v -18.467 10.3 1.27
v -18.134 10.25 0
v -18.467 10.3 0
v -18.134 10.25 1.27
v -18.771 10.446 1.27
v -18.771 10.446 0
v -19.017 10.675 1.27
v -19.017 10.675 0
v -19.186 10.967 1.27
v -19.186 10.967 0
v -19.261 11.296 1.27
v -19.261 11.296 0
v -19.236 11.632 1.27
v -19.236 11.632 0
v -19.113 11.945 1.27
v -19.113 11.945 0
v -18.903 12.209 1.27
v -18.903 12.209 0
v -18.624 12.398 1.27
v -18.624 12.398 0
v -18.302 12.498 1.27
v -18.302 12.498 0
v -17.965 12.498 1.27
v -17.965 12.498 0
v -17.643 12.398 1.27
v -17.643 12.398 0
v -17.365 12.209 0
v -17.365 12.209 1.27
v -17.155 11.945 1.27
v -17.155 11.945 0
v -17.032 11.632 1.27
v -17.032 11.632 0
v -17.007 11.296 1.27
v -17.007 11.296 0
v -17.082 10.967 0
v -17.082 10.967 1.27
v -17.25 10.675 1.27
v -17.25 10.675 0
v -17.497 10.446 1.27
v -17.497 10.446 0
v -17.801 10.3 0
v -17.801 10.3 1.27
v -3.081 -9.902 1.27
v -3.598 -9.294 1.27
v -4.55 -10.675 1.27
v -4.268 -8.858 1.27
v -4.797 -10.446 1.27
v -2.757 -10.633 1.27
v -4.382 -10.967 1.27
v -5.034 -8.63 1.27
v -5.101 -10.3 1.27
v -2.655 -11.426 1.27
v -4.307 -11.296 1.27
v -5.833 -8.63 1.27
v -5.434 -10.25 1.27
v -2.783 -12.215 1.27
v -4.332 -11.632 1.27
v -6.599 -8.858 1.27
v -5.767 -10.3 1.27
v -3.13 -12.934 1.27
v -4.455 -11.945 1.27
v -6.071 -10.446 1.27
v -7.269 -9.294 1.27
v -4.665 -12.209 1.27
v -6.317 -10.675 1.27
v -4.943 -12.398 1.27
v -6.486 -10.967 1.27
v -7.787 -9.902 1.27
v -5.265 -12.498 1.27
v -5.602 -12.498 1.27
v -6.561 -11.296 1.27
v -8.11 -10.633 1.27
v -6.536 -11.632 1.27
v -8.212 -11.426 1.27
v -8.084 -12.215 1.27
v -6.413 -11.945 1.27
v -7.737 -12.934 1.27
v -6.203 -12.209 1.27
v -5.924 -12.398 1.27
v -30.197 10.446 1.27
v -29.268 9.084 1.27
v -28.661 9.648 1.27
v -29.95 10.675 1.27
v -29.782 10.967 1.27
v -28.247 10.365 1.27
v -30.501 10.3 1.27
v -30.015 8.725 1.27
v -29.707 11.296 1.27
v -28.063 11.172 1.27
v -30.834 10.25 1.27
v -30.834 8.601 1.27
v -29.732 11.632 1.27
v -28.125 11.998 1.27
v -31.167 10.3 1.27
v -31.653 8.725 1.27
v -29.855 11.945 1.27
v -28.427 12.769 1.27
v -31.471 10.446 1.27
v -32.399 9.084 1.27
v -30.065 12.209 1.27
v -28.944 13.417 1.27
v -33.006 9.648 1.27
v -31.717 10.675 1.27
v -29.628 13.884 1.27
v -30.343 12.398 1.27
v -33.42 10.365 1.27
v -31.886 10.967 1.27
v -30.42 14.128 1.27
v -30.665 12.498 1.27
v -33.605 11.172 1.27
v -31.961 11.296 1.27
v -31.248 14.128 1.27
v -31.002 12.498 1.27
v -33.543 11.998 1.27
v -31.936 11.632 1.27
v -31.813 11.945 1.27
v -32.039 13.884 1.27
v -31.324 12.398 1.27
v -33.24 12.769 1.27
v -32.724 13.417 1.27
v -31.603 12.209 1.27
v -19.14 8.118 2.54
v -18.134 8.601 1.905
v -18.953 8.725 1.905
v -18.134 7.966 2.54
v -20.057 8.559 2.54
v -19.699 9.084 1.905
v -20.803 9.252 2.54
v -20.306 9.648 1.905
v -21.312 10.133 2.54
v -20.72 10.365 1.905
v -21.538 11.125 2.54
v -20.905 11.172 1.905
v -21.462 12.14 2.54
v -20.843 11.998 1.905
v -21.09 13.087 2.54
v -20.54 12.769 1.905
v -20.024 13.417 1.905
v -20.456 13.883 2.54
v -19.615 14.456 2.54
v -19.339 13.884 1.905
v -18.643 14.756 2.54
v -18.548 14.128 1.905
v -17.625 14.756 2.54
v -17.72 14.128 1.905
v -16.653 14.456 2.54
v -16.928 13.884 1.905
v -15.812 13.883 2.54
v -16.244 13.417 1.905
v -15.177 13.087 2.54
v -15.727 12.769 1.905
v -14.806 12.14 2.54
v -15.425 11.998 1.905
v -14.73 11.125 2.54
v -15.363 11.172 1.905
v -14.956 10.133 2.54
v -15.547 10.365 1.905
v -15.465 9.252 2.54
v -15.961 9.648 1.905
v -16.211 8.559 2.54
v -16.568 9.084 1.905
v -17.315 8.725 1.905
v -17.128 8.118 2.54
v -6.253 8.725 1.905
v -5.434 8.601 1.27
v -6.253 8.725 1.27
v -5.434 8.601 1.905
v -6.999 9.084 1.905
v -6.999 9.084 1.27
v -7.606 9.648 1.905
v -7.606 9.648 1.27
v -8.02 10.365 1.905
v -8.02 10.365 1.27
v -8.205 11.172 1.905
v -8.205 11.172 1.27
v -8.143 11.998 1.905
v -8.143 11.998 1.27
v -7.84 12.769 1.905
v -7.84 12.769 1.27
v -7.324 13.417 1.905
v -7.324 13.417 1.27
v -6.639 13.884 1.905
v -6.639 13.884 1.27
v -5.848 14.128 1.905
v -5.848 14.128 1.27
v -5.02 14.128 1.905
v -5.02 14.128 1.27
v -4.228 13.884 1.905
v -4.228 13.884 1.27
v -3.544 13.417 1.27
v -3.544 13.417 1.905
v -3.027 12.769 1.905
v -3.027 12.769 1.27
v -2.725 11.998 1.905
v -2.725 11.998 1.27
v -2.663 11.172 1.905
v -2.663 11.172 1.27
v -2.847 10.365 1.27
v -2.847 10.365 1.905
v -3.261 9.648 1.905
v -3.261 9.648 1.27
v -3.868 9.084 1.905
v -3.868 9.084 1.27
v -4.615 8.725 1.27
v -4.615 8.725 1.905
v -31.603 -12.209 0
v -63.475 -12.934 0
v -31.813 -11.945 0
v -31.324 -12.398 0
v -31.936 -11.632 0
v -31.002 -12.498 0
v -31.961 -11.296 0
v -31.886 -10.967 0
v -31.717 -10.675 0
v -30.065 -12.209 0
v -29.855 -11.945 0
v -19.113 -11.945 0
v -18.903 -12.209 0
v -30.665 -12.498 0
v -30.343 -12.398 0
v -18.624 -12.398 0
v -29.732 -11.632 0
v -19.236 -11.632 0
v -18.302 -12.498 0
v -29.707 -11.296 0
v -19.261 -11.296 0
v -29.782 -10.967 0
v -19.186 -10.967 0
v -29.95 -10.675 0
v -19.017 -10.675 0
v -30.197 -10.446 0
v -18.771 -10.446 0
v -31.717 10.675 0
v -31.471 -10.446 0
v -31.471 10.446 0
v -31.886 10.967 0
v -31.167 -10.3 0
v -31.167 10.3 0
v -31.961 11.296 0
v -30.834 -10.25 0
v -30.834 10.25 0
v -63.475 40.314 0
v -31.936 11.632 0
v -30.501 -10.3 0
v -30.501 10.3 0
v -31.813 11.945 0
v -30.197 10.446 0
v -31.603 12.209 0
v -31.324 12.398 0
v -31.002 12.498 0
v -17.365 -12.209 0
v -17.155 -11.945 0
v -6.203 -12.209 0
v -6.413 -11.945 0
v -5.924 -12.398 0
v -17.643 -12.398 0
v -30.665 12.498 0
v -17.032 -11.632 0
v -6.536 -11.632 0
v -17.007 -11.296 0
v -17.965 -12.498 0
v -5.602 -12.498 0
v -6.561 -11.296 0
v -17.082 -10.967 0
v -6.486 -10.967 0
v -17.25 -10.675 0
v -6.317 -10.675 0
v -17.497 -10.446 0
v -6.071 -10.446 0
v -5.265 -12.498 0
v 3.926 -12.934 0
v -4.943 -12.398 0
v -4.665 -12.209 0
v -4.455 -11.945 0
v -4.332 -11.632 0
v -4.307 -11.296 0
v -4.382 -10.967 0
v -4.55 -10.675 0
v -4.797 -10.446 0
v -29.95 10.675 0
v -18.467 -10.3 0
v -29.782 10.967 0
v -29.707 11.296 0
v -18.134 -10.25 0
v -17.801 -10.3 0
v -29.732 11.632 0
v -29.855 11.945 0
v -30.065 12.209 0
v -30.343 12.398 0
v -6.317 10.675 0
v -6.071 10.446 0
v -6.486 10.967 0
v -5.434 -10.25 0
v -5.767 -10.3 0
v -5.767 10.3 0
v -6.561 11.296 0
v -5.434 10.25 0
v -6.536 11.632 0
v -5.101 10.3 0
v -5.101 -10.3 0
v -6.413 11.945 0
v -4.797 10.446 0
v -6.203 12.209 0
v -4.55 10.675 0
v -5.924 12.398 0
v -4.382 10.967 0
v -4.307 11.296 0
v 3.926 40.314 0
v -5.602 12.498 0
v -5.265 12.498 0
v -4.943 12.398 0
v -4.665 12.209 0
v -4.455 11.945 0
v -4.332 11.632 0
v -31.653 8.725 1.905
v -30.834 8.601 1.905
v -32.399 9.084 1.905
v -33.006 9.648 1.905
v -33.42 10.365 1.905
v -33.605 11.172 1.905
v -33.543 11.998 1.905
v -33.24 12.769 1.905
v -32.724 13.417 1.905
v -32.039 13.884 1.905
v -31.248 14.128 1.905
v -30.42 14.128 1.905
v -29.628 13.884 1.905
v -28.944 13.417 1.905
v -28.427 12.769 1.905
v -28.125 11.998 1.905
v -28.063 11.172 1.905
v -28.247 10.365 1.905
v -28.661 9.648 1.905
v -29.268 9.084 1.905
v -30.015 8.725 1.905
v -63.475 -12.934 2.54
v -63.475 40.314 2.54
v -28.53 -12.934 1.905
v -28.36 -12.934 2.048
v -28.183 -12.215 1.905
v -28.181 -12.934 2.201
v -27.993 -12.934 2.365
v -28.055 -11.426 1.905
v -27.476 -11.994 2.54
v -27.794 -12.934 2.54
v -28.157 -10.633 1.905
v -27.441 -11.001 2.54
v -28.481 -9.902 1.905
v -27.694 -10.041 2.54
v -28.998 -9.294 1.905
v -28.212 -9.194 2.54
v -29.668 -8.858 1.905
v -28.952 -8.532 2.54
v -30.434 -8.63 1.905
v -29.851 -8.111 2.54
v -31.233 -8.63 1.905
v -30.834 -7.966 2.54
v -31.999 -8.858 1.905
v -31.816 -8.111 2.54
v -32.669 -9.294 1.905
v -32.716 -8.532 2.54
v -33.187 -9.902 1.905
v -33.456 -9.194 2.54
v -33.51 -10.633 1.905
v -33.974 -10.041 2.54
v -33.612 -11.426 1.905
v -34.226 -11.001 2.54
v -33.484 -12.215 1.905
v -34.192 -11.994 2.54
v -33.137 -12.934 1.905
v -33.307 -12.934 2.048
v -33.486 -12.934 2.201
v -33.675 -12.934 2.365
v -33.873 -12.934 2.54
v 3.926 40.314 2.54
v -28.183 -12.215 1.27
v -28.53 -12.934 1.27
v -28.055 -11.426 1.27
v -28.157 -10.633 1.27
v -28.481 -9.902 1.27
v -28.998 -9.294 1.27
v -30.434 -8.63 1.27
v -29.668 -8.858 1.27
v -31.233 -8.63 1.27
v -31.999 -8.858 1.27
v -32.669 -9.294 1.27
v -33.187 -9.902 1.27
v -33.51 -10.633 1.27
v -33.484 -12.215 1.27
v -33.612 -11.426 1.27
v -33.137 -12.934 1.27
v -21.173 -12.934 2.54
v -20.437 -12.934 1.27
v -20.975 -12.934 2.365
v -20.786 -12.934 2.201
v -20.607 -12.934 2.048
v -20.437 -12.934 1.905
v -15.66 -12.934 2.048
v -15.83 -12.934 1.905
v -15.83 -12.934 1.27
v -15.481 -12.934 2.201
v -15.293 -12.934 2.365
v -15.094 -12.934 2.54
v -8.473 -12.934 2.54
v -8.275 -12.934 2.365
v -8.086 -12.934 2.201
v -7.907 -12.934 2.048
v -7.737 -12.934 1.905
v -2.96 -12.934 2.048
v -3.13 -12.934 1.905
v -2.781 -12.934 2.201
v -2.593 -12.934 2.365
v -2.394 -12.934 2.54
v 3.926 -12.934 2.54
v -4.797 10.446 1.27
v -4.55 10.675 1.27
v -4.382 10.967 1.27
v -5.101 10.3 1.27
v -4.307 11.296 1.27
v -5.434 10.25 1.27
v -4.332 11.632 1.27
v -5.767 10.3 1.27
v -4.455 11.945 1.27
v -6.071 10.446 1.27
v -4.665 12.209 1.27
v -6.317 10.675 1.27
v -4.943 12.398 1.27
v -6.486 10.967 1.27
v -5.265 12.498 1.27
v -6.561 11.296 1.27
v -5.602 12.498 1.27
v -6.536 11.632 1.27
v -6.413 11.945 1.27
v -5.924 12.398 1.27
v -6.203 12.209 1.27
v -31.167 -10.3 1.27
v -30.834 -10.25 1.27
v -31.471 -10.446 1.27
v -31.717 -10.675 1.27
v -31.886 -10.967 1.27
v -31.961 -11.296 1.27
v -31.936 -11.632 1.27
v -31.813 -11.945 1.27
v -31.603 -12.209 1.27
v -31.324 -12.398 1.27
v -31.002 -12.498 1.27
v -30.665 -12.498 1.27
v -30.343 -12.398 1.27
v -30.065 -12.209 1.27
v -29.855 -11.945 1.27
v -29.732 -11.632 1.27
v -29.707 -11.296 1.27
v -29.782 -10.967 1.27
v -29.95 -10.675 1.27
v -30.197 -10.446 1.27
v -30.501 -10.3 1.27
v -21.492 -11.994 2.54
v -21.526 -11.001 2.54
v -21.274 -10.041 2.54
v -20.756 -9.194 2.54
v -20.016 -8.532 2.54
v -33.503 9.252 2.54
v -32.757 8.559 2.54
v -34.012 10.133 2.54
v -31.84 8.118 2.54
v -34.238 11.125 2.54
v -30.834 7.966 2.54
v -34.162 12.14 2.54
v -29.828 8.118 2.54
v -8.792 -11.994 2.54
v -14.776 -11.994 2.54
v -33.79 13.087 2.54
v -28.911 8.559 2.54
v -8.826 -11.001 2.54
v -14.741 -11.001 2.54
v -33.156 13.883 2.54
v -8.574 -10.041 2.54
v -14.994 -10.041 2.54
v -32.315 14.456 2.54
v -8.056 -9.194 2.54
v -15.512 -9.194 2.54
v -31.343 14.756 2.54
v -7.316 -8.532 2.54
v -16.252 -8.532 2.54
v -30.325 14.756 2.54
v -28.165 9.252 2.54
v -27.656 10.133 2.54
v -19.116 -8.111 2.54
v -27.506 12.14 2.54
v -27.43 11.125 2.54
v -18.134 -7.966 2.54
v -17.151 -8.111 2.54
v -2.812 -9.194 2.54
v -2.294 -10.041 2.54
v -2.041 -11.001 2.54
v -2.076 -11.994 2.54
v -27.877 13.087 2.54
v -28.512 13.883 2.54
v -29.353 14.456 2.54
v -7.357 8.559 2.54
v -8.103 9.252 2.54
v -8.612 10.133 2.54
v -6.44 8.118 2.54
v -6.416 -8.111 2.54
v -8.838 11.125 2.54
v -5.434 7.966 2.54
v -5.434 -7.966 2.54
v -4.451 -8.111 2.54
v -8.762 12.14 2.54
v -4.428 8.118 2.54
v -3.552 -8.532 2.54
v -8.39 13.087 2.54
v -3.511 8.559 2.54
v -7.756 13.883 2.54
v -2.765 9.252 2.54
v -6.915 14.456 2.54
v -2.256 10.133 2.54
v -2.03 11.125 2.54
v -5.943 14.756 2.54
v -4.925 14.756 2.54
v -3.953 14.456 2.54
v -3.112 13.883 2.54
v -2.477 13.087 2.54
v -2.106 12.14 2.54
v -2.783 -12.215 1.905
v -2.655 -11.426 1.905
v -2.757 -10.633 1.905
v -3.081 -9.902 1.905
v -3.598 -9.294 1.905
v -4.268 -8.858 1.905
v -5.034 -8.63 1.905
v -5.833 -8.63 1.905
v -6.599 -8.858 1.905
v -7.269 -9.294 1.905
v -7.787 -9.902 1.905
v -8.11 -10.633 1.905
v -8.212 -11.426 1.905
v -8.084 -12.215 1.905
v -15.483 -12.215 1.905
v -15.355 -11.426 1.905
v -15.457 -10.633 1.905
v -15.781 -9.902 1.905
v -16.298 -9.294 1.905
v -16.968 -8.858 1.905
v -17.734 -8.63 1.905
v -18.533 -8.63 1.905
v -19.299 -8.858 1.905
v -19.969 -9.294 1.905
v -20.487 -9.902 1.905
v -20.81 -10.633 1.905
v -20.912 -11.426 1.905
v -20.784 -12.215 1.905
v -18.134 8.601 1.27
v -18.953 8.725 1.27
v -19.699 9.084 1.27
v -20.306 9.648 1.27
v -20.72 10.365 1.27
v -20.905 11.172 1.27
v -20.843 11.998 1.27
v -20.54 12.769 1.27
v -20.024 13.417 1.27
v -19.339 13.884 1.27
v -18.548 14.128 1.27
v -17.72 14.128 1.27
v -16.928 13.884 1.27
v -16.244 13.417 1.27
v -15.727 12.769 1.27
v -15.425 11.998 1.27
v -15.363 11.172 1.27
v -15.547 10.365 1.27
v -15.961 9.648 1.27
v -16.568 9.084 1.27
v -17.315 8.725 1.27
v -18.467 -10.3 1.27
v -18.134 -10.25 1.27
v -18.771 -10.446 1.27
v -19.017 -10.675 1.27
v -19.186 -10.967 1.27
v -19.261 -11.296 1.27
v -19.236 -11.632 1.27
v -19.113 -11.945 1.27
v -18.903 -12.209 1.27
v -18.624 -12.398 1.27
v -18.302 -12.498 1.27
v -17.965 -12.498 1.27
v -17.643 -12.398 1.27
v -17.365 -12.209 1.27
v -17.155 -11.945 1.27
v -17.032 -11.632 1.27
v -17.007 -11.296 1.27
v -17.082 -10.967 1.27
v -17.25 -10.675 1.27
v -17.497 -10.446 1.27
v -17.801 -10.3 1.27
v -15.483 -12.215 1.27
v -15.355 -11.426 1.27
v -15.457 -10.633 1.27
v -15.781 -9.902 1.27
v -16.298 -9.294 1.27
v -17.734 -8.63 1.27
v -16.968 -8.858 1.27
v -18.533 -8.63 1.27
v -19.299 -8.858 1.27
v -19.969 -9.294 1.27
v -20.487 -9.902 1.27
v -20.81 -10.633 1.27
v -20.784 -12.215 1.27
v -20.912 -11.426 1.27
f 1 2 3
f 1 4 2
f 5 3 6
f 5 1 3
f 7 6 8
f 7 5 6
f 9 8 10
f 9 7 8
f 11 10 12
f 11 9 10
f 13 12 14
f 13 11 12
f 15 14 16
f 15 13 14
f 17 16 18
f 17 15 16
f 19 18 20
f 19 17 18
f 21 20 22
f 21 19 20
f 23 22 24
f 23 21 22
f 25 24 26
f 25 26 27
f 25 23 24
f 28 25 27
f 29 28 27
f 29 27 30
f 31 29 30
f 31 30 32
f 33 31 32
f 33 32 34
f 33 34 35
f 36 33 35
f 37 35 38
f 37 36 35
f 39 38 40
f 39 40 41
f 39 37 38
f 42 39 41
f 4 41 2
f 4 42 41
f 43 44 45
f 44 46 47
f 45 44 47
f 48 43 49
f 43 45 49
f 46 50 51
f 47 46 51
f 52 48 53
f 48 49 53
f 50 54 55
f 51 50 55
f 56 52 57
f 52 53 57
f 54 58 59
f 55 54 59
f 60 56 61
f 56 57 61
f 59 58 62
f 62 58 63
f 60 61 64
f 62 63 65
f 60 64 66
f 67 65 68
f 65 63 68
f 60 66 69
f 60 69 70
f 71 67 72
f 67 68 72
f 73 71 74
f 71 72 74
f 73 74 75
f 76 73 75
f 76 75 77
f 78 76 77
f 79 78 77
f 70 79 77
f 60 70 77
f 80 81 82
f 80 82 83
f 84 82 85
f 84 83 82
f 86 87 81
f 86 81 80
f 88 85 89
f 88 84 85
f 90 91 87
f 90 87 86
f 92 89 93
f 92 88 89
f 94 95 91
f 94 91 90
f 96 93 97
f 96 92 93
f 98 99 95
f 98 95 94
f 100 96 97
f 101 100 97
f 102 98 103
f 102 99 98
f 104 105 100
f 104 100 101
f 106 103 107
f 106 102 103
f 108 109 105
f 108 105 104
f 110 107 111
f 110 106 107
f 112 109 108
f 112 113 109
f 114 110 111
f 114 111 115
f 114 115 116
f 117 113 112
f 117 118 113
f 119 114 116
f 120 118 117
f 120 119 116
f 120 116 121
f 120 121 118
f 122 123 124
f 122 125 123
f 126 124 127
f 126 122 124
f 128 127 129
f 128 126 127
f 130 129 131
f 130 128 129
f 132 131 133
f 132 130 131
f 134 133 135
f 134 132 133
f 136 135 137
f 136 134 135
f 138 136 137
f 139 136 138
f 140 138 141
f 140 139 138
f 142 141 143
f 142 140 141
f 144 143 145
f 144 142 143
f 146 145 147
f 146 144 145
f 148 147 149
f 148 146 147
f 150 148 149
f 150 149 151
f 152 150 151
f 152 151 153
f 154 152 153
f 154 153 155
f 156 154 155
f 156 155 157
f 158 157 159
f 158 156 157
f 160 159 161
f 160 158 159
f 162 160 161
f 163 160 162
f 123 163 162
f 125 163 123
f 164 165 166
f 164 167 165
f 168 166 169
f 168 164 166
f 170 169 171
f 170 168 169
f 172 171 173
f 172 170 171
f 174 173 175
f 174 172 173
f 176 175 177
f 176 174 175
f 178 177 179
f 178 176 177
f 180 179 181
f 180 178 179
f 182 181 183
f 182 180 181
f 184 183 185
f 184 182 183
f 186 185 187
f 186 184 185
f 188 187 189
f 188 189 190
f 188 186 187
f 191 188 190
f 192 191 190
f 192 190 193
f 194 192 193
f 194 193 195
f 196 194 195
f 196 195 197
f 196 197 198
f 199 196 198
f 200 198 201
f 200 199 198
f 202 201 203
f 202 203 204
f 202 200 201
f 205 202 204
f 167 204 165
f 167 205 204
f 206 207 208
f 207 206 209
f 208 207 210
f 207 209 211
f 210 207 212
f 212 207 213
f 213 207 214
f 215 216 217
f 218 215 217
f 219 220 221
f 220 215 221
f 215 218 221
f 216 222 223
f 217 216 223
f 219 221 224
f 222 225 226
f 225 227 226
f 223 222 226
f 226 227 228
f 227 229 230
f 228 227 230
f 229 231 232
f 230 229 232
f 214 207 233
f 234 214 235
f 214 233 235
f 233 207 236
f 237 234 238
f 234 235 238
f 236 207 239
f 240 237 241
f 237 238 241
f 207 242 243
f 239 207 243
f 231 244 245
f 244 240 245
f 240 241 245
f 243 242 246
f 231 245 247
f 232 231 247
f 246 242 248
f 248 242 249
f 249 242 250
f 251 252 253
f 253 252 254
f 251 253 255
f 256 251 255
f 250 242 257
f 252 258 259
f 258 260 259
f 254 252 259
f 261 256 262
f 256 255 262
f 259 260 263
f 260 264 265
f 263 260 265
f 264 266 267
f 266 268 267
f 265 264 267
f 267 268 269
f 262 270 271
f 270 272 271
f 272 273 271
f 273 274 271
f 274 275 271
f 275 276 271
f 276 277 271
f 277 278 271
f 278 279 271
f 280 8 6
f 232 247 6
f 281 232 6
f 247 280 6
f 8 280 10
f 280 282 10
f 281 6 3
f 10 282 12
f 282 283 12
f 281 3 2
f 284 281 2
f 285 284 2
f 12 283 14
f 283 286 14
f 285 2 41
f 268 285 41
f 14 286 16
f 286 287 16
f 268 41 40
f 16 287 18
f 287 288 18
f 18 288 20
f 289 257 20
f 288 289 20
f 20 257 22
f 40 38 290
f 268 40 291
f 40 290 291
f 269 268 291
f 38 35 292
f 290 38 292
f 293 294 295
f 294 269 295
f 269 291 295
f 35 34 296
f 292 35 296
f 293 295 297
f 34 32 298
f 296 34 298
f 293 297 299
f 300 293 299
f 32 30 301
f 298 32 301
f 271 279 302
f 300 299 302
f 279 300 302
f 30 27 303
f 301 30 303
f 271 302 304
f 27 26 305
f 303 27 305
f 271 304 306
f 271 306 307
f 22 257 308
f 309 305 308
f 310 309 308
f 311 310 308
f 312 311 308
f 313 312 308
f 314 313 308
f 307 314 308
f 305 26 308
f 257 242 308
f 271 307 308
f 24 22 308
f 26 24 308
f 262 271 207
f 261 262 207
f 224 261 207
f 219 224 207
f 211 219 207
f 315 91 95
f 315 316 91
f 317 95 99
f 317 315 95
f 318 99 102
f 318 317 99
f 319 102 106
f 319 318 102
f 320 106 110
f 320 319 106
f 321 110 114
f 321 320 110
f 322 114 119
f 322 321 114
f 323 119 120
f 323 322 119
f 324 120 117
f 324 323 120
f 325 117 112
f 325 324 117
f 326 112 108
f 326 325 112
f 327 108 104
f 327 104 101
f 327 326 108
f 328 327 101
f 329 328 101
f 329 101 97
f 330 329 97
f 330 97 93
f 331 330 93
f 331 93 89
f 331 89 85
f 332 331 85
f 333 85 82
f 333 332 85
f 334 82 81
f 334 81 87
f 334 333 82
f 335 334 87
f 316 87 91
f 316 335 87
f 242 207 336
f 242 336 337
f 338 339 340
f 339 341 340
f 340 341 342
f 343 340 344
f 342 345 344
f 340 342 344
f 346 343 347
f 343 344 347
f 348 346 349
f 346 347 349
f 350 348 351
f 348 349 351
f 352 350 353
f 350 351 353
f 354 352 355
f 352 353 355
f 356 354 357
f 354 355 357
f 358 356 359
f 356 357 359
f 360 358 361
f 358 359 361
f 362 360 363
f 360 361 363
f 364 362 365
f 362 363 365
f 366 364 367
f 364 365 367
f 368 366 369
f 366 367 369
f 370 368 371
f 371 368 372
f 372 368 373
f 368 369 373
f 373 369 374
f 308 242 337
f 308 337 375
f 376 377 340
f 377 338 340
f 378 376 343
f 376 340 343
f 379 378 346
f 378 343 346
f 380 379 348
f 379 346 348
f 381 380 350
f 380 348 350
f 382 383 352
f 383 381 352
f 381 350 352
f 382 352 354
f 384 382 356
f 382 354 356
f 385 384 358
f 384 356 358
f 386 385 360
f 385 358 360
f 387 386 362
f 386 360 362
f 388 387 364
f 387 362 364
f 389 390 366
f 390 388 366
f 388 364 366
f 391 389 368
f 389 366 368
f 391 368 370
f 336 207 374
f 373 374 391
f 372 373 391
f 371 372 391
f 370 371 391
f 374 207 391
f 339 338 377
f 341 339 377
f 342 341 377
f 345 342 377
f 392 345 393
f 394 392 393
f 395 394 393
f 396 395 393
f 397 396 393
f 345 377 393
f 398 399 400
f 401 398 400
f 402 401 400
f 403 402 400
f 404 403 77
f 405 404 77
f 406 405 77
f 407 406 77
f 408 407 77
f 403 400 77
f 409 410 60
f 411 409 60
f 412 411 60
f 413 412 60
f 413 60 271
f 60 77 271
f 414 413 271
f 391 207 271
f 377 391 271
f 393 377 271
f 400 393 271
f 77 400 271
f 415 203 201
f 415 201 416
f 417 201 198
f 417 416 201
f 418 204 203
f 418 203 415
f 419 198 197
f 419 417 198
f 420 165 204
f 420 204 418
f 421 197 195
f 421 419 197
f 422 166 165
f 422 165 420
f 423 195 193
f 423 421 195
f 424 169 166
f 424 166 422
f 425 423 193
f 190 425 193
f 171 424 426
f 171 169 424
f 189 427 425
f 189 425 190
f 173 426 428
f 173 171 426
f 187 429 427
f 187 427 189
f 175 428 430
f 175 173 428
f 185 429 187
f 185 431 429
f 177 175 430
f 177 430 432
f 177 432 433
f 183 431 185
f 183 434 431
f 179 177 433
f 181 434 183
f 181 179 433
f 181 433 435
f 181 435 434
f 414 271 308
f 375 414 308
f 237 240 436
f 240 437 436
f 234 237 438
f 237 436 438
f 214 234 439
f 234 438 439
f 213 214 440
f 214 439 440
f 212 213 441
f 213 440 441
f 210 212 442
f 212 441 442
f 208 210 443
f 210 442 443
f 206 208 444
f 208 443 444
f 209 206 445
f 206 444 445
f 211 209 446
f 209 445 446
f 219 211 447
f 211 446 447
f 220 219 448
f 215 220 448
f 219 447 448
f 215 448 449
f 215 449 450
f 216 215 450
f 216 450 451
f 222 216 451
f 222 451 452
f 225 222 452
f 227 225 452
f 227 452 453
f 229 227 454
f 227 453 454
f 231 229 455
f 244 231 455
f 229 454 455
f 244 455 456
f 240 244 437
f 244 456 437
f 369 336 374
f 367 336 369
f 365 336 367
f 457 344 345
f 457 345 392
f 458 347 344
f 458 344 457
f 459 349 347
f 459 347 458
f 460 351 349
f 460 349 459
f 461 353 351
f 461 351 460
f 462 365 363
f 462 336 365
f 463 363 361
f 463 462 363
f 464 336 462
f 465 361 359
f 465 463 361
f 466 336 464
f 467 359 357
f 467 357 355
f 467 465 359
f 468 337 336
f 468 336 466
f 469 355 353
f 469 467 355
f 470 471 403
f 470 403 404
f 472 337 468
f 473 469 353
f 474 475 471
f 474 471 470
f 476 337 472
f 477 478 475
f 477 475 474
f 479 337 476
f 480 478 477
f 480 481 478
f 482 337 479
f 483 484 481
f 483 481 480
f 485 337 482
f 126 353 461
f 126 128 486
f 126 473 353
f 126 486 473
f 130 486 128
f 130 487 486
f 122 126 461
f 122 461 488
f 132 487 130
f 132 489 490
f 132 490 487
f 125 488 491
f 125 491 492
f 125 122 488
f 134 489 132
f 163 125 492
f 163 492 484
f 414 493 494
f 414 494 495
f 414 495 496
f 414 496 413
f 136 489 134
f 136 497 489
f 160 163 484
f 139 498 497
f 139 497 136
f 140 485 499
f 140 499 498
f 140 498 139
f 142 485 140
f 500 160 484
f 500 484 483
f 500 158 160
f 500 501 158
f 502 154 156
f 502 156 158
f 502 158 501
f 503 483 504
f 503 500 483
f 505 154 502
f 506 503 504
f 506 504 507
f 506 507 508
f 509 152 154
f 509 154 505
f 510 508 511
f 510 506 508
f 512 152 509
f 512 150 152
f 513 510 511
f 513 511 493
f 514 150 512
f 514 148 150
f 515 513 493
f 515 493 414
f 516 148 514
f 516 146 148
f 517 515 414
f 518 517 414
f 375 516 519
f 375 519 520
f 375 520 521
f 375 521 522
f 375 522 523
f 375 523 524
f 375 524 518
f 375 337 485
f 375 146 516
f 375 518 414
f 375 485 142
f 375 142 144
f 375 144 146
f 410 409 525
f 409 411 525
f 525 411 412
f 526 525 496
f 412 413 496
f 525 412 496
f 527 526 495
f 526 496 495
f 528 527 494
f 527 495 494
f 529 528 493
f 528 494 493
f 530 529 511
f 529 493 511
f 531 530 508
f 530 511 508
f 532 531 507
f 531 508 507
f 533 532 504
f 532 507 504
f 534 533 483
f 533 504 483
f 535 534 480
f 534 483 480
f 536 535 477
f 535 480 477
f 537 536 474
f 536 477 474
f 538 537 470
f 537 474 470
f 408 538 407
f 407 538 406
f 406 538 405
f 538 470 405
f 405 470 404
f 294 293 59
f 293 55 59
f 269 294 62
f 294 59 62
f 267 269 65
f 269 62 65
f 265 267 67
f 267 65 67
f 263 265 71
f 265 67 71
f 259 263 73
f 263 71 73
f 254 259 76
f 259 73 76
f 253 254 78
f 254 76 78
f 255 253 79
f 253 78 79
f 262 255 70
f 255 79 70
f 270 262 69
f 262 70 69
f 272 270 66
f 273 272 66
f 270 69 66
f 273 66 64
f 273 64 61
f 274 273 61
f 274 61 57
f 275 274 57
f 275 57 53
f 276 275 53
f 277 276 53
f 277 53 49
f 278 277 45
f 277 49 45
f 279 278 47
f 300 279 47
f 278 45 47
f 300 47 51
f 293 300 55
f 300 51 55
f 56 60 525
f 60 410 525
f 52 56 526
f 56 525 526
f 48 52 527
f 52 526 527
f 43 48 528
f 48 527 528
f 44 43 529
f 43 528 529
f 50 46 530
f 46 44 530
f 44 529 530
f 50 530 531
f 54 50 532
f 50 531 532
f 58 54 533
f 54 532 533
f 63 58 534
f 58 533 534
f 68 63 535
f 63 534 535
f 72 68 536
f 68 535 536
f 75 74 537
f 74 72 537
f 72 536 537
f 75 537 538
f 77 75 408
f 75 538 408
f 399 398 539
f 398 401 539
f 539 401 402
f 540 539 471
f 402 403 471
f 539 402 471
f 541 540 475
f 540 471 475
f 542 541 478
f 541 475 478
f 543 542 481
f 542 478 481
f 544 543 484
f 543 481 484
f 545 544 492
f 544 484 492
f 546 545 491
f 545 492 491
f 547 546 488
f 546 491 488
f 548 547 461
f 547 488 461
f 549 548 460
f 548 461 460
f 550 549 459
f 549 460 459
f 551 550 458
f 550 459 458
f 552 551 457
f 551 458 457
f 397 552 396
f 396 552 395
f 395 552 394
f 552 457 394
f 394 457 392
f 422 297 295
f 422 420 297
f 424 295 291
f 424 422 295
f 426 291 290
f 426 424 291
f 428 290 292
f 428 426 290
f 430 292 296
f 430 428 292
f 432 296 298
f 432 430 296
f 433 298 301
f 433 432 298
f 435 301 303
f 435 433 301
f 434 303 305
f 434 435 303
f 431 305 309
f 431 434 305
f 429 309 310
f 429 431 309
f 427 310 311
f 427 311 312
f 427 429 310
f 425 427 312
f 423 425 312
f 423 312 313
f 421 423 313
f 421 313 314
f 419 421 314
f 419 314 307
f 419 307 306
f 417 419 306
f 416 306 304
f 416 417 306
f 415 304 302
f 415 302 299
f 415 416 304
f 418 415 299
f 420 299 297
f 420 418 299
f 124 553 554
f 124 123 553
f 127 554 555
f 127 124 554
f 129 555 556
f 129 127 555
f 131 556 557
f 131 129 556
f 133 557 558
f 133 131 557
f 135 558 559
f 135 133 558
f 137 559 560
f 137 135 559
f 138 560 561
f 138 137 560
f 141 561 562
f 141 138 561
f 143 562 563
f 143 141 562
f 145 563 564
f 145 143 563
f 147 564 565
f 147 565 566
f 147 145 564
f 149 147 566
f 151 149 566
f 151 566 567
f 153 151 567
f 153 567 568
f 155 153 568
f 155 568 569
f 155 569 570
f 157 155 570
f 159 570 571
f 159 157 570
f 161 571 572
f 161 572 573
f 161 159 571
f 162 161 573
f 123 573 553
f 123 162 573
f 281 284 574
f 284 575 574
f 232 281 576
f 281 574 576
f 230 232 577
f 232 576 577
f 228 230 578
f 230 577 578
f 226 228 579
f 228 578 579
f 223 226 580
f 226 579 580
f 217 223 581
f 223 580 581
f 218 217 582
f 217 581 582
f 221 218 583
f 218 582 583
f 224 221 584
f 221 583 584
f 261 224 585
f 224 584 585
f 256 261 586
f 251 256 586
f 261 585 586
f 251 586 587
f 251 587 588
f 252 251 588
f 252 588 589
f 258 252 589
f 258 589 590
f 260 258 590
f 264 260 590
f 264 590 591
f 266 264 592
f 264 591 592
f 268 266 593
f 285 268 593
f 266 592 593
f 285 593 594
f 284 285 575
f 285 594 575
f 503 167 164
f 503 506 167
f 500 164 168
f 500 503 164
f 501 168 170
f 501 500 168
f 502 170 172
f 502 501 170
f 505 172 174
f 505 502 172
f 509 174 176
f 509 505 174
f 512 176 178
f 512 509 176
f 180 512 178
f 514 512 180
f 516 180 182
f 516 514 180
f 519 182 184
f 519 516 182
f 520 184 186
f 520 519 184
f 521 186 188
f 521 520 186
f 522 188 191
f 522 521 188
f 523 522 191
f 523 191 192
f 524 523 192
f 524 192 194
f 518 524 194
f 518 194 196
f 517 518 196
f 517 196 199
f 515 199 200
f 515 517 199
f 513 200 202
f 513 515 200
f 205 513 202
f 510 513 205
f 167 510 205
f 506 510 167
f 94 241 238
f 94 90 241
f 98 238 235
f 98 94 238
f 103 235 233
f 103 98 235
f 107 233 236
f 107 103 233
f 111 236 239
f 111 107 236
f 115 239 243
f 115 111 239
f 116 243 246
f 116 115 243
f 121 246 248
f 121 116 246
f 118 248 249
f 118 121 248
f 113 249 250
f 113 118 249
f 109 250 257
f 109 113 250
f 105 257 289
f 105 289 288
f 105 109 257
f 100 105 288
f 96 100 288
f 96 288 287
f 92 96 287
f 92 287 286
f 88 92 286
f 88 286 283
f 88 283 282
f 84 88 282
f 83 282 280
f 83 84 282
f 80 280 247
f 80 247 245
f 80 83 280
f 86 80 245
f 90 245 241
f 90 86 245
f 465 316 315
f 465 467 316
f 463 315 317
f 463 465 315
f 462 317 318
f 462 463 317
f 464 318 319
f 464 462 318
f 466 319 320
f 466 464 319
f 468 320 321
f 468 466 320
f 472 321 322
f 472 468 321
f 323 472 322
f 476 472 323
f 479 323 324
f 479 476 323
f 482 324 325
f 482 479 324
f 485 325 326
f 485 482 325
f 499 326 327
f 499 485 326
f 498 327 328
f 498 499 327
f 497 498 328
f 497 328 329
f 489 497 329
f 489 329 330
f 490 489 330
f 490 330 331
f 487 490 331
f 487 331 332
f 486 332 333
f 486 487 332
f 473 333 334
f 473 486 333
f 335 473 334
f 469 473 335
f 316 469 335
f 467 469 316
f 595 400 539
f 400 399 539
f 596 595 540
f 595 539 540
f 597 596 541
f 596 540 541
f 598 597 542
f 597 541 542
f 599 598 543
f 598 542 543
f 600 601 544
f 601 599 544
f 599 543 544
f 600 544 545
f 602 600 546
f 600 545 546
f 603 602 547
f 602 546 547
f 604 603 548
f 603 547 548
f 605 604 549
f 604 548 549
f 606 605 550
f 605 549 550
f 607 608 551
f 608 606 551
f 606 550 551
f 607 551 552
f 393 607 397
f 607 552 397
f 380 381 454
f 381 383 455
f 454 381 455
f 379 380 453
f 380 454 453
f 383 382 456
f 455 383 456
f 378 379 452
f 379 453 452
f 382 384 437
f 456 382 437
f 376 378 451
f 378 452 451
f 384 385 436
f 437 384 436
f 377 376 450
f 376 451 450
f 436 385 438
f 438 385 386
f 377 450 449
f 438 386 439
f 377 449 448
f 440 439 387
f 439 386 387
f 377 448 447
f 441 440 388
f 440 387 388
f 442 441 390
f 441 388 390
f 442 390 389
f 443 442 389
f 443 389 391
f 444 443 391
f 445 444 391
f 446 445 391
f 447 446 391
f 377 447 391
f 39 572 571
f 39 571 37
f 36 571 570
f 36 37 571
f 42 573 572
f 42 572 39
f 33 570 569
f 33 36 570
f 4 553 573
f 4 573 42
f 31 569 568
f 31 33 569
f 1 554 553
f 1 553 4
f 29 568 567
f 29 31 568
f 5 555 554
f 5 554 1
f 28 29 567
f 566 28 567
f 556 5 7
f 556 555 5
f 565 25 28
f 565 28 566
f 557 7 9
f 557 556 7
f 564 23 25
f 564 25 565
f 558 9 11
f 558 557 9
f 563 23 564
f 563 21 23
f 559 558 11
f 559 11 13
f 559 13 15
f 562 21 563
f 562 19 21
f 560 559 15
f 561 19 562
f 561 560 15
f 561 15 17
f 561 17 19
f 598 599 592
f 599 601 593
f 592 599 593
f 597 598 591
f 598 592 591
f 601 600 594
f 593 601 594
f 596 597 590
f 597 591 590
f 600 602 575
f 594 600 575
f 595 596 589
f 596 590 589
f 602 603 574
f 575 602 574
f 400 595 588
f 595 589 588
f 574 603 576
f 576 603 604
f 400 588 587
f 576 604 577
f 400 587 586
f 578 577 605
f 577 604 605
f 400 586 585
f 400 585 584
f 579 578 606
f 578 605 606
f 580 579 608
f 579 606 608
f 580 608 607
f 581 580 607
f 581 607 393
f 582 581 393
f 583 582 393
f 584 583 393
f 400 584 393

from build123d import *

# Parameters (mm, degrees)
SKETCH1_W           = 67.400289577
SKETCH1_H           = 53.248033992
BOSS_EXTRUDE1_DEPTH = 2.54
LPATTERN1_COUNT     = 3
LPATTERN1_PITCH     = 12.7


with BuildPart() as part:
    # Sketch1 → Boss-Extrude1 (new body)
    with BuildSketch(Plane.XY):
        with Locations((-29.774643138, 13.689630717)):
            Rectangle(SKETCH1_W, SKETCH1_H)
    extrude(amount=BOSS_EXTRUDE1_DEPTH)

    # Sketch3 → CBORE for #2 Binding Head Machine Screw1 (revolve, cut)
    with BuildSketch(Plane(origin=(-30.833791182, 11.380076337, 2.54), x_dir=(0, -1, 0), z_dir=(1, 0, 0))):
        Polygon((0, 0), (0, 2.54), (1.1303, 2.54), (1.1303, 1.27), (2.77876, 1.27), (2.77876, 0.635), (3.41376, 0), align=None)
    cbore_for_2_binding_head_machine_screw1 = revolve(axis=Axis((-30.833791182, 11.380076337, 8.89), (0, 0, -1)), mode=Mode.SUBTRACT)

    # LPattern1: CBORE for #2 Binding Head Machine Screw1 ×3
    with Locations(*[(i * LPATTERN1_PITCH, 0, 0) for i in range(1, LPATTERN1_COUNT)]):
        add(cbore_for_2_binding_head_machine_screw1, mode=Mode.SUBTRACT)

    # Mirror1: CBORE for #2 Binding Head Machine Screw1 across plane
    add(cbore_for_2_binding_head_machine_screw1.mirror(Plane.ZX), mode=Mode.SUBTRACT)

    # Mirror1 copy 1 sketch → Mirror1 copy 1 (revolve, cut)
    with BuildSketch(Plane(origin=(-18.133791182, -11.380076337, 2.54), x_dir=(0, 1, 0), z_dir=(1, 0, 0))):
        Polygon((0, 0), (0, -2.54), (1.1303, -2.54), (1.1303, -1.27), (2.77876, -1.27), (2.77876, -0.635), (3.41376, 0), align=None)
    revolve(axis=Axis((-18.133791182, -11.380076337, 8.89), (0, 0, 1)), mode=Mode.SUBTRACT)

    # Mirror1 copy 2 sketch → Mirror1 copy 2 (revolve, cut)
    with BuildSketch(Plane(origin=(-5.433791182, -11.380076337, 2.54), x_dir=(0, 1, 0), z_dir=(1, 0, 0))):
        Polygon((0, 0), (0, -2.54), (1.1303, -2.54), (1.1303, -1.27), (2.77876, -1.27), (2.77876, -0.635), (3.41376, 0), align=None)
    revolve(axis=Axis((-5.433791182, -11.380076337, 8.89), (0, 0, 1)), mode=Mode.SUBTRACT)


solid = part.part
